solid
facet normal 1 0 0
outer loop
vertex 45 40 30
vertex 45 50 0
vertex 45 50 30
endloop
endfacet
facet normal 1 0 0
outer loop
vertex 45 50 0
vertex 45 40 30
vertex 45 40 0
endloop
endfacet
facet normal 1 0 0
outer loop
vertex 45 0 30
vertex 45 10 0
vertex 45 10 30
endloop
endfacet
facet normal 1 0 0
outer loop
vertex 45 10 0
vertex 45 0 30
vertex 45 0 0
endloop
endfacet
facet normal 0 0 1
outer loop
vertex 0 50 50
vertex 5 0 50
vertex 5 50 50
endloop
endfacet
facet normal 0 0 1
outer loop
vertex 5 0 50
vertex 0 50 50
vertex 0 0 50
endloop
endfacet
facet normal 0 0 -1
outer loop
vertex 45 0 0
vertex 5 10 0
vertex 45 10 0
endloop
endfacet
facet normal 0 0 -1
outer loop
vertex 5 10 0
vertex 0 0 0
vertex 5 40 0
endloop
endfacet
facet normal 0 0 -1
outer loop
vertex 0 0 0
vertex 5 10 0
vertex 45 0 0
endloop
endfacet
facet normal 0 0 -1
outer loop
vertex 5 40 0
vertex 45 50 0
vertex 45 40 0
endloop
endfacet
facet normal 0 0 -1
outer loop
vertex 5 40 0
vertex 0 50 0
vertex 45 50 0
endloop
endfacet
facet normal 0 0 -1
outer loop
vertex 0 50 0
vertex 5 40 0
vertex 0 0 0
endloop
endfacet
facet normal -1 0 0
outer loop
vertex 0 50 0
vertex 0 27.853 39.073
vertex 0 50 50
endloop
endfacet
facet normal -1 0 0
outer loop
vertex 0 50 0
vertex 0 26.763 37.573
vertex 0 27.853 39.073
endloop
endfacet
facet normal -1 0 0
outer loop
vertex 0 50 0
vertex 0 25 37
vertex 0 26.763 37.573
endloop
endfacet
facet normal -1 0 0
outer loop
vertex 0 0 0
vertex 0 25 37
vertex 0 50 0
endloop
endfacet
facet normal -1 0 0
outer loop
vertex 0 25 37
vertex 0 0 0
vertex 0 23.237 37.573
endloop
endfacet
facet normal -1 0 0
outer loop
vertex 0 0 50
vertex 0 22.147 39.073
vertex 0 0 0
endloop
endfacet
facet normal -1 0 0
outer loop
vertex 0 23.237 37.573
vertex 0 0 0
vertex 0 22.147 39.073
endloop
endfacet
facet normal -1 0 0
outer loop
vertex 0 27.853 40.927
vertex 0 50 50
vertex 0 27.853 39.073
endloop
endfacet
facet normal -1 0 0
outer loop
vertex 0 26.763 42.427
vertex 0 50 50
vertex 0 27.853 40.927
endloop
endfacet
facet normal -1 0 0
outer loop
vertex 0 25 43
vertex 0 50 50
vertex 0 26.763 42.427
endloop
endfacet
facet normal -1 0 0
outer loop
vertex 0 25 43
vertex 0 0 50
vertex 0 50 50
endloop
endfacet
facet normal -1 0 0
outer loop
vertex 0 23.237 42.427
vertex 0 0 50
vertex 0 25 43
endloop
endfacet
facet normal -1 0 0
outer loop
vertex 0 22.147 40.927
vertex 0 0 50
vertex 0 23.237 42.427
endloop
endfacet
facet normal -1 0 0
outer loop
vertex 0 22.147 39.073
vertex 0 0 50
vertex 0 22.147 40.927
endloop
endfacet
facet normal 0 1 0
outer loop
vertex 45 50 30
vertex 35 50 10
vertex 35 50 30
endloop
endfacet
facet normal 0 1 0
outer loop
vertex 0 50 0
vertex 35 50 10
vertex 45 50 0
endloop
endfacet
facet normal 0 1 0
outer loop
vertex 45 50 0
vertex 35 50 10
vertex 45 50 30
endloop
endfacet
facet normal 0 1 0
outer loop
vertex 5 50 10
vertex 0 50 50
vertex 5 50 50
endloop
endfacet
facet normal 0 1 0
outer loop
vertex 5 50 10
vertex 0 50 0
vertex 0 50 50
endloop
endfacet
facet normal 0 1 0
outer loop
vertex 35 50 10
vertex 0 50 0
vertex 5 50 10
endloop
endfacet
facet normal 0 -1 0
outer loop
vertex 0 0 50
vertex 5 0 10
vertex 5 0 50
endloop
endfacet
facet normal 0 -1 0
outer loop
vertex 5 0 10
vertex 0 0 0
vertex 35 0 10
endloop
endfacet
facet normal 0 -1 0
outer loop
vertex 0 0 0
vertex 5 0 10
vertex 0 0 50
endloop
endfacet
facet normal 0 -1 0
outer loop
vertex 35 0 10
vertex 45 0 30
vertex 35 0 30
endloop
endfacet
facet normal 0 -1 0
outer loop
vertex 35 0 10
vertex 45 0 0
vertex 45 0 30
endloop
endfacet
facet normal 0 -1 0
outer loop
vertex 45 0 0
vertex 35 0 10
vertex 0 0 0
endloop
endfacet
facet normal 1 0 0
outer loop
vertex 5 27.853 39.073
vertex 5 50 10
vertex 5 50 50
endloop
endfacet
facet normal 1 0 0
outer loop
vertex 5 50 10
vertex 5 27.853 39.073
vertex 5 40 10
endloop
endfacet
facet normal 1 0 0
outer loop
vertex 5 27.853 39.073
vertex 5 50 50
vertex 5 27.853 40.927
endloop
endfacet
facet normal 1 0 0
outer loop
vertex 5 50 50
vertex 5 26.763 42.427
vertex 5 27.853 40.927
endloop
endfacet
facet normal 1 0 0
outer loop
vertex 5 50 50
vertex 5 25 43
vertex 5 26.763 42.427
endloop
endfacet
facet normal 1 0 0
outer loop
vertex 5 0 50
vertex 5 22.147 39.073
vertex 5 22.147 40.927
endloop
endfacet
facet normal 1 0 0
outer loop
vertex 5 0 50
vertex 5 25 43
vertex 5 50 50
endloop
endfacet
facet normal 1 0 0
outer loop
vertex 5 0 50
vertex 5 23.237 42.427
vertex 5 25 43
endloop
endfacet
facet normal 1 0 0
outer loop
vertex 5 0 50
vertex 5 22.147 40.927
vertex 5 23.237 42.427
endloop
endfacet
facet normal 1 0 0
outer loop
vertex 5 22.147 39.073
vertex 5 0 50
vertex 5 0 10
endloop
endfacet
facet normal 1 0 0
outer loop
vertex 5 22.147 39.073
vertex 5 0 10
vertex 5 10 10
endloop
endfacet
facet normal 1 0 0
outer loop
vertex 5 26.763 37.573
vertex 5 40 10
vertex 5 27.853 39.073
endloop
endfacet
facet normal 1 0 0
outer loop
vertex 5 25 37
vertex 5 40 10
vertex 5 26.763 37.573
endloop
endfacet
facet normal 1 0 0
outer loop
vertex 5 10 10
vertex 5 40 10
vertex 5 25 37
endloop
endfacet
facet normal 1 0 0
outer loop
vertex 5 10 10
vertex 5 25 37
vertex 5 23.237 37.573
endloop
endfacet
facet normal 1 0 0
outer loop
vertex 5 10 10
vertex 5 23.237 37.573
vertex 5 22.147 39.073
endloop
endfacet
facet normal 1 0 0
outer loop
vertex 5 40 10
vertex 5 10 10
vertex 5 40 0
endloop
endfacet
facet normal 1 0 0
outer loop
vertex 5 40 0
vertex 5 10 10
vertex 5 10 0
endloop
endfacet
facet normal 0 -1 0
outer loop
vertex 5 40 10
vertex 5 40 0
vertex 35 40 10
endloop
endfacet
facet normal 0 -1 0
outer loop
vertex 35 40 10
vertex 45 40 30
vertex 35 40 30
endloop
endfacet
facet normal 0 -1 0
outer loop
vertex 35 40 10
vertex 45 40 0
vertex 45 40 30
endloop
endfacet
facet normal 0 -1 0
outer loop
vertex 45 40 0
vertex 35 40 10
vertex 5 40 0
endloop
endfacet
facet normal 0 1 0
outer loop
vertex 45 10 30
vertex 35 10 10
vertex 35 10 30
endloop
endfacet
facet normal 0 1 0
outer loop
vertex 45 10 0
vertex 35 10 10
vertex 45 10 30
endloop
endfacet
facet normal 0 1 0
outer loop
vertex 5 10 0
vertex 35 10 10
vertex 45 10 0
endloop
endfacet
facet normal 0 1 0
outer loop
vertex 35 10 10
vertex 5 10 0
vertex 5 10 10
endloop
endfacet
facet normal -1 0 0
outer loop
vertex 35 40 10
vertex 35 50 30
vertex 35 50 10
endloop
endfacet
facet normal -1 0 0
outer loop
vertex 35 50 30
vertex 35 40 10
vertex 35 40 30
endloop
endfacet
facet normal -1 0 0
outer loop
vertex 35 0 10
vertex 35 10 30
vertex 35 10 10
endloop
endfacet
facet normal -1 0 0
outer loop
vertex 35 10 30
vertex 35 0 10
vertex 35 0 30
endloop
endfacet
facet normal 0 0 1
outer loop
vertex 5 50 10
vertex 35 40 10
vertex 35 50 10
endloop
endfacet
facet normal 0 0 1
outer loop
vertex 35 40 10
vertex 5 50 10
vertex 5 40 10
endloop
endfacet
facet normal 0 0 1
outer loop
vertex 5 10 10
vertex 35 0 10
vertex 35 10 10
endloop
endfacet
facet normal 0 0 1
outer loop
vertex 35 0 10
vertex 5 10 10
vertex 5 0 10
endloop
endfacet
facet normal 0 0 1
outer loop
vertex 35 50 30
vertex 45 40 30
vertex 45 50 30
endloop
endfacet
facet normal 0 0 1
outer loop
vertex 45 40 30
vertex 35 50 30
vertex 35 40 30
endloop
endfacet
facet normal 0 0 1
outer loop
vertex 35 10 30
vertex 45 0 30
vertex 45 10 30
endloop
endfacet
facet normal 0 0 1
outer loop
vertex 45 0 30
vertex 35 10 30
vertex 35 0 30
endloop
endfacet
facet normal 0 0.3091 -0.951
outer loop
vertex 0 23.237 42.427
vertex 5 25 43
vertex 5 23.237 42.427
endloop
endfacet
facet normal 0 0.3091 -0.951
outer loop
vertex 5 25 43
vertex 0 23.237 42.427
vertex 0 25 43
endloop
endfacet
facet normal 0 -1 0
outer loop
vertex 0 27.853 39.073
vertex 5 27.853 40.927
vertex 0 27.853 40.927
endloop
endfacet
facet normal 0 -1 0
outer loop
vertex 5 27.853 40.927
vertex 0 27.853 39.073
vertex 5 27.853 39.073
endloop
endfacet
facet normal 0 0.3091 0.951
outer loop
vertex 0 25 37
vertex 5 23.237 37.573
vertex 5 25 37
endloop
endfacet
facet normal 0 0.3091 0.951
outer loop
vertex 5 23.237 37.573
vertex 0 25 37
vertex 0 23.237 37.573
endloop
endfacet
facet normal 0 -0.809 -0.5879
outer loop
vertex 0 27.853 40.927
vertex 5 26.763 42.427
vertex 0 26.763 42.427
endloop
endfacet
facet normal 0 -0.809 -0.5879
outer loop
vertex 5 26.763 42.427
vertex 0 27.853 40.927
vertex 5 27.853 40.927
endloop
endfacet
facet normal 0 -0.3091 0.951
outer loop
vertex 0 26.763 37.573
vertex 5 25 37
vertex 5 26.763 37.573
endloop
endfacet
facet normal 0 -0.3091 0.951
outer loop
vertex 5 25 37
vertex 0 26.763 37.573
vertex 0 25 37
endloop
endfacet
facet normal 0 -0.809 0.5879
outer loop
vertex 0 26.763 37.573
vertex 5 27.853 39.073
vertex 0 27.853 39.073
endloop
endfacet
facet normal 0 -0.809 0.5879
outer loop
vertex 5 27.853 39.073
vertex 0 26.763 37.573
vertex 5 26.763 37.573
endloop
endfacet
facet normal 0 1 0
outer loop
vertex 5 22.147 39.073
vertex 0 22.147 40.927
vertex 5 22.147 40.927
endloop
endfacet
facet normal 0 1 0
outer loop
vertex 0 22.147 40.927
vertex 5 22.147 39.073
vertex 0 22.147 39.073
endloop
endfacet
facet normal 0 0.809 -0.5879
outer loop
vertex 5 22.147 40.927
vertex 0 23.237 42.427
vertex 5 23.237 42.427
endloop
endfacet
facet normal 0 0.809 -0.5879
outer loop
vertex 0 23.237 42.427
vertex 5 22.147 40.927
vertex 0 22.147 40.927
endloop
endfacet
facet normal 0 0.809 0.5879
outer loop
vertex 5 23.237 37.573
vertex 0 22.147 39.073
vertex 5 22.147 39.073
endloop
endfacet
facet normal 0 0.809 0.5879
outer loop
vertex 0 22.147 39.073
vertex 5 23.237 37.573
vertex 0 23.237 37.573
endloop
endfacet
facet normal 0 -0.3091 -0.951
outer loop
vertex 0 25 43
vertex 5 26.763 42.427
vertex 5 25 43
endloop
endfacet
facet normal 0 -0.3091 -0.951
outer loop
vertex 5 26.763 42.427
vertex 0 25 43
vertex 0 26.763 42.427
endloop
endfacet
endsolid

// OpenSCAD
difference()
{
    cube([45,50,50]);
    translate([5,10,-5]) cube([70,30,40]);
    translate([5,-5,10]) cube([30,60,60]);
    translate([5,-5,30]) cube([65,60,60]);
    translate([-2,25,40]) rotate([0,90,0]) cylinder(d=6,h=10);
}
